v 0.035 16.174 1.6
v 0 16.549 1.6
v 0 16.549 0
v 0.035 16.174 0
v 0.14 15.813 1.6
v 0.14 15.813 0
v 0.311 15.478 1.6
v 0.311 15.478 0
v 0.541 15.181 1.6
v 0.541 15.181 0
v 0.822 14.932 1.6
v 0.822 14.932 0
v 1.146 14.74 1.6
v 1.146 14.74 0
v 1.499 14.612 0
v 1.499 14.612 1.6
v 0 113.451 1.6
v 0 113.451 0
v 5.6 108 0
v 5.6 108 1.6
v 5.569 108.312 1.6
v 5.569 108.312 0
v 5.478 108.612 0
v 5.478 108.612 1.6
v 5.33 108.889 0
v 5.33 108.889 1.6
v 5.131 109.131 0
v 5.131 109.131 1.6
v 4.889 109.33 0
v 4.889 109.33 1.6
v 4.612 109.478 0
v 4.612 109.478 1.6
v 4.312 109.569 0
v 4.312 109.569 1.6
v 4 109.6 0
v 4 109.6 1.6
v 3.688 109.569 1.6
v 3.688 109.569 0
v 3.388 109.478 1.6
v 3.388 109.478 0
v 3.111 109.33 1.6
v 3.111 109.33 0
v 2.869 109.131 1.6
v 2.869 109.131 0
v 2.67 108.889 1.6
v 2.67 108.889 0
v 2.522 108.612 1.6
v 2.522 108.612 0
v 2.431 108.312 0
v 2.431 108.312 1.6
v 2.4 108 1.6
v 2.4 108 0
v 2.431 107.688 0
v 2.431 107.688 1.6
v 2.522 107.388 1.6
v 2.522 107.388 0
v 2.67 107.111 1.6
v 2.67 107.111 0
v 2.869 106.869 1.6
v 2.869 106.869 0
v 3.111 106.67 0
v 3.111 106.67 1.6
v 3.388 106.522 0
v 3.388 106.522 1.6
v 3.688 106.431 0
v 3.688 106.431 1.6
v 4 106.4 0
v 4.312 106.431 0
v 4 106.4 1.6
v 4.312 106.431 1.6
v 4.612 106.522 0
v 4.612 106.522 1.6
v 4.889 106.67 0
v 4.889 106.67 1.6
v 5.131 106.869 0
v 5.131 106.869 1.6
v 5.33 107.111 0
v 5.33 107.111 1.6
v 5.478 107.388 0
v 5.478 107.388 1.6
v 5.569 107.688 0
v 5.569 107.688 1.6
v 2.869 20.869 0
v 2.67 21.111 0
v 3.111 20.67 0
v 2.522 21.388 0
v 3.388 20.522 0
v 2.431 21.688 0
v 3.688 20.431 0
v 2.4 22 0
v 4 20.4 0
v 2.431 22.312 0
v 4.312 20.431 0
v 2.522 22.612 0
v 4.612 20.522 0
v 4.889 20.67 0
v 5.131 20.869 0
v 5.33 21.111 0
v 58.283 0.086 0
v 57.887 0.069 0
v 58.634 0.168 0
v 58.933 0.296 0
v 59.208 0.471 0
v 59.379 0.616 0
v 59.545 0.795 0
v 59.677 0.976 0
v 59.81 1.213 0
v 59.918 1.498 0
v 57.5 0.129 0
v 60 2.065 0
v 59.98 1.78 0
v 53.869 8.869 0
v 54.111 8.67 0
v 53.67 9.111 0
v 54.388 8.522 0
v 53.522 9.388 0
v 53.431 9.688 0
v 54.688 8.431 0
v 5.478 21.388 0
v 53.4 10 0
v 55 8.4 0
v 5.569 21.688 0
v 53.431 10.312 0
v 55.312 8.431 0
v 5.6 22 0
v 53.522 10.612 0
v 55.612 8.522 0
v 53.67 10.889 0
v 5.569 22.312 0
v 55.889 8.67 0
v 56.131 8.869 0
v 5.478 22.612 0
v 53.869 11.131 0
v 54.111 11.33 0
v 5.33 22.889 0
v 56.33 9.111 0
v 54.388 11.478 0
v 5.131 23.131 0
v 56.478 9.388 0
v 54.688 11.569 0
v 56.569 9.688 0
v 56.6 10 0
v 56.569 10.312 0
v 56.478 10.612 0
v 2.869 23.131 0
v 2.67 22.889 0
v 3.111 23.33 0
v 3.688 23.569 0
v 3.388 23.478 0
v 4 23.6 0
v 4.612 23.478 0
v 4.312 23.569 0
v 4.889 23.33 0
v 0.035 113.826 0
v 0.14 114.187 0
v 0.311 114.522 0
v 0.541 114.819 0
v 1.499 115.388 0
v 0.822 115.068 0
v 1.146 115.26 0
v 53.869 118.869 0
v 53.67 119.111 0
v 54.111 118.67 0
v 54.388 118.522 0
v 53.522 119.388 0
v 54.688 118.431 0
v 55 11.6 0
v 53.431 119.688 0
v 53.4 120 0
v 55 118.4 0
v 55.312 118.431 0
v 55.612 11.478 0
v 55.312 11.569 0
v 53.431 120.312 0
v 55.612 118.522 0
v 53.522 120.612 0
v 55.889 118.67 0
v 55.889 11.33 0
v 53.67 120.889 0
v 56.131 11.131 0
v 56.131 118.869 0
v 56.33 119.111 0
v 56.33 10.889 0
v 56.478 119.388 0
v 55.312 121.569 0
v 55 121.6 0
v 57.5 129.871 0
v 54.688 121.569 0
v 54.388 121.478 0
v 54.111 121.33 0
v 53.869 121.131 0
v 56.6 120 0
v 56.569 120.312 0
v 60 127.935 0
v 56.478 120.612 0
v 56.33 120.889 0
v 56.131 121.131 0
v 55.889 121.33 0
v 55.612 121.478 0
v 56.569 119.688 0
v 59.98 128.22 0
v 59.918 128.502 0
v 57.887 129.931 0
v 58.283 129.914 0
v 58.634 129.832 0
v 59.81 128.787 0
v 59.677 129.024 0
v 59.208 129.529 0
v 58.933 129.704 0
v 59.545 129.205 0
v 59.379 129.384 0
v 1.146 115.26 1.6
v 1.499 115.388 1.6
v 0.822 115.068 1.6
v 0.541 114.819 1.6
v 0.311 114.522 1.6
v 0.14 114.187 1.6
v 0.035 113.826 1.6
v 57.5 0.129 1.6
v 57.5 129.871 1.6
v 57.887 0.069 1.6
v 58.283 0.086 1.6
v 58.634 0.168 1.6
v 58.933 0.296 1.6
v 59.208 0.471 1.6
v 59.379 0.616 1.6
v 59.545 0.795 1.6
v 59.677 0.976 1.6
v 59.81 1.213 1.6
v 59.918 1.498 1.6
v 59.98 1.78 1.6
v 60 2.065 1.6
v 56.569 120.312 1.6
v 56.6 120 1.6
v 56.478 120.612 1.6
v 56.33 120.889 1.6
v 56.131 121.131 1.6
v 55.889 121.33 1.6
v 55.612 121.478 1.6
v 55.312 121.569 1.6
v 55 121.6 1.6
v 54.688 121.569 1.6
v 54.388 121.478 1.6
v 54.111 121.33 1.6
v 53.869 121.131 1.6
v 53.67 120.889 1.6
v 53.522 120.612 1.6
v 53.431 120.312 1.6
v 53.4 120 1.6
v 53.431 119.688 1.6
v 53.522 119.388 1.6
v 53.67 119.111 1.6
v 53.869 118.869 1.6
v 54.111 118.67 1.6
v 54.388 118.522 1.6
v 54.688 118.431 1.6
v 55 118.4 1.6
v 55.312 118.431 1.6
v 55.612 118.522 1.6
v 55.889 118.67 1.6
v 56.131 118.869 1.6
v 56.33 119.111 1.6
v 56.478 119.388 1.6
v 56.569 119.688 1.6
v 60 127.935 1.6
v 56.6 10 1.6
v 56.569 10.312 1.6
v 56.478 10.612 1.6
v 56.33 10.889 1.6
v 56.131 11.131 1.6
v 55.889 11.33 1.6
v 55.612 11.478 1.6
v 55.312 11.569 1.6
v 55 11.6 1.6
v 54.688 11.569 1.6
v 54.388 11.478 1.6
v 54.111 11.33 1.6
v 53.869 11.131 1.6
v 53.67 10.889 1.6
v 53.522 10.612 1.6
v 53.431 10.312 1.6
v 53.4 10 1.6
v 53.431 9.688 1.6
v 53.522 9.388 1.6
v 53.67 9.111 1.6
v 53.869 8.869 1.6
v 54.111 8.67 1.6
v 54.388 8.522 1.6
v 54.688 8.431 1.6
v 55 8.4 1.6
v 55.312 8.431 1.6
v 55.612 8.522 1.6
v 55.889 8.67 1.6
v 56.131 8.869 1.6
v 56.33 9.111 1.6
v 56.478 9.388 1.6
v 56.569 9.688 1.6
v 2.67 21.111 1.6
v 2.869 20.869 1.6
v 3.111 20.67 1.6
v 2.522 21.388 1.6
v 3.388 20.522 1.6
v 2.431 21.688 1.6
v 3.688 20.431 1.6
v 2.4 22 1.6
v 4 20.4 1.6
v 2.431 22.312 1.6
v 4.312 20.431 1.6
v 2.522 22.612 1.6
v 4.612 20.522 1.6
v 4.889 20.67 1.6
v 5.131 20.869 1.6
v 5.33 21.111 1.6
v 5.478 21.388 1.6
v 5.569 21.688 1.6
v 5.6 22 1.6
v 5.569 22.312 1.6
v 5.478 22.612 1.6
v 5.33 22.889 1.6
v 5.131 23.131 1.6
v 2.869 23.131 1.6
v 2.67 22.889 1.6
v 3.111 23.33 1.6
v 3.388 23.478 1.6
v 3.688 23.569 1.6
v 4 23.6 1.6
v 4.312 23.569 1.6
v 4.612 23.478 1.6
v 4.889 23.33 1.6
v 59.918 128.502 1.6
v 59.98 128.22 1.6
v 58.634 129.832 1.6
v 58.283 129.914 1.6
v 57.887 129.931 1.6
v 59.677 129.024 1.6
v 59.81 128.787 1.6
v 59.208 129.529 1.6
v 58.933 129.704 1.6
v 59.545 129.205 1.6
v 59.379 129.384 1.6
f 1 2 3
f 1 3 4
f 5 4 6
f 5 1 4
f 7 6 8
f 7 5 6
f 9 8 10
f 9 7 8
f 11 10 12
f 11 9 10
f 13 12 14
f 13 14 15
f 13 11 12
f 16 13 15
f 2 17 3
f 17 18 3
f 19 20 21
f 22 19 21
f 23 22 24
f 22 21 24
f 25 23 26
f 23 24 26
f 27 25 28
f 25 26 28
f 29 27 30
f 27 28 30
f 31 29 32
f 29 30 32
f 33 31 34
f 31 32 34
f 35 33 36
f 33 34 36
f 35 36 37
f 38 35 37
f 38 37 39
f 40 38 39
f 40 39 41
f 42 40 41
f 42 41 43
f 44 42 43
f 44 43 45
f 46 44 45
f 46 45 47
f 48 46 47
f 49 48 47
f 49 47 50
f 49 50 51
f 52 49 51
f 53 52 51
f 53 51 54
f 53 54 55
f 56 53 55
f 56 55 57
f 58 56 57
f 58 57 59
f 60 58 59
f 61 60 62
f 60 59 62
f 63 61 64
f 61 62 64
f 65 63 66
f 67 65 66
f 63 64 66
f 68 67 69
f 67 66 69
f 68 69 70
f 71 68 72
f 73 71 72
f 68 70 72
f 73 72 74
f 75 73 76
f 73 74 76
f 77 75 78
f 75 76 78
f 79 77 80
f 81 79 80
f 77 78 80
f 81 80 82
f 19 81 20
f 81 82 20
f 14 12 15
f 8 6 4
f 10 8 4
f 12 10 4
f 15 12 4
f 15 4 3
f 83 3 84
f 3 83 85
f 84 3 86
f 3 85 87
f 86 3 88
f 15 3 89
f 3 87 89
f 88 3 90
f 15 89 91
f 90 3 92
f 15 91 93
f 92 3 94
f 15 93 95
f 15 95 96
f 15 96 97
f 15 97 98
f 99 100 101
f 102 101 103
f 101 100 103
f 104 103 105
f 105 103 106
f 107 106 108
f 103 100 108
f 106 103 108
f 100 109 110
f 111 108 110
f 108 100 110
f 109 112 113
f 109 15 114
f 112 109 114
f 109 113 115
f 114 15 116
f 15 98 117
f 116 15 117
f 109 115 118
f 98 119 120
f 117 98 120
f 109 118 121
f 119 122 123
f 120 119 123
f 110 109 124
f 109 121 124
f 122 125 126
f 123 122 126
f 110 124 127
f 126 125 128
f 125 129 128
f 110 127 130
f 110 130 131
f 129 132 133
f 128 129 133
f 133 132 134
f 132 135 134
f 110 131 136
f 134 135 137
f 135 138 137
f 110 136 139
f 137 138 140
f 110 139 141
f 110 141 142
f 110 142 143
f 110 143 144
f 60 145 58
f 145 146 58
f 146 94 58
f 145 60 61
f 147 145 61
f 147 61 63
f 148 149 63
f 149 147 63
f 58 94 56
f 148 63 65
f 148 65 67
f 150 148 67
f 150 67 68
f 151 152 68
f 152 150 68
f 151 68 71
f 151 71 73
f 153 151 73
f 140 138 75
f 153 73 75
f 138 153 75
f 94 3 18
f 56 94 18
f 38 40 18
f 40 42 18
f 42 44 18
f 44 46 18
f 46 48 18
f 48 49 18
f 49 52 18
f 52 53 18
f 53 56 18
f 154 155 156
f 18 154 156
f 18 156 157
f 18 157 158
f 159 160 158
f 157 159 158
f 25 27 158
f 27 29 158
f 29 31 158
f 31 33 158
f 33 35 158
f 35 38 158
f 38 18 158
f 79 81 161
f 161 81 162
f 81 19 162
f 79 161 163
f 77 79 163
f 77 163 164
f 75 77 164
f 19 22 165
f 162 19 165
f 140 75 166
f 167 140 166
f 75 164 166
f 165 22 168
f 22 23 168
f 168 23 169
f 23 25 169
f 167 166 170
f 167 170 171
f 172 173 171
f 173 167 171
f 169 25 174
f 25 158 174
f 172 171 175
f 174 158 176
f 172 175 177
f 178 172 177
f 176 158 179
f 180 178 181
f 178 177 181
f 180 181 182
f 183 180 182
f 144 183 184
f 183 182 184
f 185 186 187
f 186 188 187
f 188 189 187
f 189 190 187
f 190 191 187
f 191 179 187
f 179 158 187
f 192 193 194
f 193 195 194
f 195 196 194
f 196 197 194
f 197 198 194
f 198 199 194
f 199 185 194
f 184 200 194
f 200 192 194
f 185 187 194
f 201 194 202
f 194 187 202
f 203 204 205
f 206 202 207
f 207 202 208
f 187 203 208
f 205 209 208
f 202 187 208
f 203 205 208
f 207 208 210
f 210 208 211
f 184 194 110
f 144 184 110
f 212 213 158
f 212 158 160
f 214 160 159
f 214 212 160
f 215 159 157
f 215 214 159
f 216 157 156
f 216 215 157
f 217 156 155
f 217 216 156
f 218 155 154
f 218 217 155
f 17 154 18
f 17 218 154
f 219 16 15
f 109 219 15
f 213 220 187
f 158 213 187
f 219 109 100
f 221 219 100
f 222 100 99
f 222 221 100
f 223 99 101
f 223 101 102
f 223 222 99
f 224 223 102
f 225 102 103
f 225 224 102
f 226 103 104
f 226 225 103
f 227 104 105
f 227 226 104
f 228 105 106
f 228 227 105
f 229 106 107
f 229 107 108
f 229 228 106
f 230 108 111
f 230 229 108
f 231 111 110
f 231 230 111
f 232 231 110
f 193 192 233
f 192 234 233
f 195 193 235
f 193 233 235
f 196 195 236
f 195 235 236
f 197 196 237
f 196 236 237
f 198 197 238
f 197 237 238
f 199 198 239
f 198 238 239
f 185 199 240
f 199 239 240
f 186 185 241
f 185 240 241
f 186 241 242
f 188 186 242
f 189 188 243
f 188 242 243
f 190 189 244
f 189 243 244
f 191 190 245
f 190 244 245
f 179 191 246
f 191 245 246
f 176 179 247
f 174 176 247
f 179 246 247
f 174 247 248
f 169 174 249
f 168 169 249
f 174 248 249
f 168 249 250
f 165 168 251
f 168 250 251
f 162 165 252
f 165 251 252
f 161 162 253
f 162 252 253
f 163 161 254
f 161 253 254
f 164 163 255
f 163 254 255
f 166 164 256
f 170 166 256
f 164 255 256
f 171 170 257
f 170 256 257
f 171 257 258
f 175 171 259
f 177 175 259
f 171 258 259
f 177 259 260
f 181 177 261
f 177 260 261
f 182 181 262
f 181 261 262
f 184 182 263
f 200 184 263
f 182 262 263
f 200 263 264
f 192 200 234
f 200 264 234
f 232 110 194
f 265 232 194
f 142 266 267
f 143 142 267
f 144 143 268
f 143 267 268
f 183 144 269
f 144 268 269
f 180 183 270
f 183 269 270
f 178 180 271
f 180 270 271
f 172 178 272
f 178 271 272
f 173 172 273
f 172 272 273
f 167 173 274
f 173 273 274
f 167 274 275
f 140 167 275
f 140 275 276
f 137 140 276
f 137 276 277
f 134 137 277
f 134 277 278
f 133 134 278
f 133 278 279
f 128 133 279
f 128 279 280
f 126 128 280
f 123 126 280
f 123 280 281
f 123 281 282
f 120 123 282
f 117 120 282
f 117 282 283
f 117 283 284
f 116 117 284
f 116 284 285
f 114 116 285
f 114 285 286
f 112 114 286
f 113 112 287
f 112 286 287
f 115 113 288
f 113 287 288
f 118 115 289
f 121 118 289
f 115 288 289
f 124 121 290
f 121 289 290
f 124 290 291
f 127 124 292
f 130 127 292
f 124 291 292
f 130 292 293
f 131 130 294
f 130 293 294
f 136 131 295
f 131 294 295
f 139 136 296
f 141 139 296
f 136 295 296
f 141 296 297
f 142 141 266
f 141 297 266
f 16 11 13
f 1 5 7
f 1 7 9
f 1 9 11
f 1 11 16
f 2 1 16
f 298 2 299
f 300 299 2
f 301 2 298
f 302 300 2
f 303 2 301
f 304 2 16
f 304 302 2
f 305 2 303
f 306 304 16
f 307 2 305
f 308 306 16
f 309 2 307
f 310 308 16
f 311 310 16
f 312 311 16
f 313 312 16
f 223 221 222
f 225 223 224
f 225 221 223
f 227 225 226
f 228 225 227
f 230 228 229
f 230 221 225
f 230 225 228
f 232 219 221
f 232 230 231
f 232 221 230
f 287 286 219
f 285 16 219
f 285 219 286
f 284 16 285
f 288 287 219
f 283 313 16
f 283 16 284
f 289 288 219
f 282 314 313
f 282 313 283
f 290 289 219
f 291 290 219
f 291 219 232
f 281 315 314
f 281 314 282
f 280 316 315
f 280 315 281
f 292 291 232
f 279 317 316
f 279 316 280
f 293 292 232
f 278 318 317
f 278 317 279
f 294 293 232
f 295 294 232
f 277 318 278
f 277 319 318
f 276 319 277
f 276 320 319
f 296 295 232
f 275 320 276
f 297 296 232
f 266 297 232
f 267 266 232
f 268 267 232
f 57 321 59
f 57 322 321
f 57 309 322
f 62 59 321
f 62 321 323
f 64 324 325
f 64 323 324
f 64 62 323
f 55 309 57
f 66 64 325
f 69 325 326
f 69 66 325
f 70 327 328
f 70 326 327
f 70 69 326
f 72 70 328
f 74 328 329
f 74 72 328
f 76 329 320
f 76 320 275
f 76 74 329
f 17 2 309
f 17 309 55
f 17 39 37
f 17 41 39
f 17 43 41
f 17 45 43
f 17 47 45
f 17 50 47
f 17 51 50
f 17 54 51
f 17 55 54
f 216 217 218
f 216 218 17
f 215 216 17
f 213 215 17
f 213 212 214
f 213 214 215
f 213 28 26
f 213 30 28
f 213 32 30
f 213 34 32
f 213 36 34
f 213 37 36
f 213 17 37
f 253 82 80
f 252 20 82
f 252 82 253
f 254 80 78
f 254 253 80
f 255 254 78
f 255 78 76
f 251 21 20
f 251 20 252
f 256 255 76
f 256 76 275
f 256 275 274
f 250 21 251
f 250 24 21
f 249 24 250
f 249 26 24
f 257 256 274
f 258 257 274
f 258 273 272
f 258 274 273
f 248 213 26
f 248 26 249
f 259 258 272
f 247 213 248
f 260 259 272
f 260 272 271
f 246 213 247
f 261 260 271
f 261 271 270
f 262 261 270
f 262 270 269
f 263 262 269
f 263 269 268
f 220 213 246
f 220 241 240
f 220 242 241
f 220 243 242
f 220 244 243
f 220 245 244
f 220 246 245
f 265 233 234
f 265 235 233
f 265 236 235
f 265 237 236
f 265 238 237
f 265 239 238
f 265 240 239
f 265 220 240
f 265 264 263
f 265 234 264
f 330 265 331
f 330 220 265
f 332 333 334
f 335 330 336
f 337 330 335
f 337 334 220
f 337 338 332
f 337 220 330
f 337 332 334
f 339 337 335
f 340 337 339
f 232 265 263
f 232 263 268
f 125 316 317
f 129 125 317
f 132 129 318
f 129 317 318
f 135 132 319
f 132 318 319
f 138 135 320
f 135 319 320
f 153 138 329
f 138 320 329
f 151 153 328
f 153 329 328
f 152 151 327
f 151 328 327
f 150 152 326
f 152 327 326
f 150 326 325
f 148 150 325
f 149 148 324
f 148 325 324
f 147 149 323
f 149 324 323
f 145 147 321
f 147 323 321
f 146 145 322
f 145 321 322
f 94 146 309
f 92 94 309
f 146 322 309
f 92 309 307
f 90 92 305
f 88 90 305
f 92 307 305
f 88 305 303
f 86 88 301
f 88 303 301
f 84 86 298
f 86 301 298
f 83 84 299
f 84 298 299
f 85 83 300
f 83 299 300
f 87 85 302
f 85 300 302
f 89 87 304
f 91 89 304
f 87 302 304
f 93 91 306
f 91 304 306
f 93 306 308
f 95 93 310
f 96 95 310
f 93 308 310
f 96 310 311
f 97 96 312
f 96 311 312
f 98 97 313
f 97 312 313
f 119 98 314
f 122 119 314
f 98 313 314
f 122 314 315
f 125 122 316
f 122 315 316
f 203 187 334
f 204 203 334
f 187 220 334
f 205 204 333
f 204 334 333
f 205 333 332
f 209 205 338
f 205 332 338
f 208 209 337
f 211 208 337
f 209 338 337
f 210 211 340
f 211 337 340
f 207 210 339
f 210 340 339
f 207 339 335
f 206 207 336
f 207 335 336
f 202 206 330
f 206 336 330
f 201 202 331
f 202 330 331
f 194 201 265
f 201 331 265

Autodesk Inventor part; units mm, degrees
ref_plane "YZ Plane" through (0, 0, 0) normal (1, 0, 0) x (0, 1, 0)
ref_plane "XZ Plane" through (0, 0, 0) normal (0, 1, 0) x (-1, 0, 0)
ref_plane "XY Plane" through (0, 0, 0) normal (0, 0, 1) x (1, 0, 0)
sketch "Esquisse1" plane through (0, 0, 0) normal (0, 0, 1) x (1, 0, 0)
  line L0 (0, 0) -> (60, 0)
  line L1 (60, 0) -> (60, 130)
  line L2 (60, 130) -> (0, 130)
  line L3 (0, 130) -> (0, 0)
  dimension "d0" = 130
  dimension "d1" = 60
extrude "Extrusion1" add sketch "Esquisse1" along normal blind 1.6
chamfer "Chanfrein1" distance 58 distance2 15 1 edges at (0, 130, 0.8) measured on face at (40, 130, 0.5333)
chamfer "Chanfrein2" distance 15 distance2 58 1 edges at (0, 0, 0.8) measured on face at (0, 76.6667, 1.0667)
fillet "Congé1" radius 2 6 edges at (60, 0, 0.8) (0, 15, 0.8) (0, 115, 0.8) (60, 130, 0.8) (58, 130, 0.8) (58, 0, 0.8)
sketch "Esquisse2" plane through (0, 0, 1.6) normal (0, 0, 1) x (1, 0, 0)
  circle A0 centre (4, 22) radius 1.6
  circle A1 centre (55, 10) radius 1.6
  circle A2 centre (4, 108) radius 1.6
  circle A3 centre (55, 120) radius 1.6
  line L0 (0, 113.4514) -> (0, 16.5486) projected
  arc A4 (57.4992, 0.1295) -> (60, 2.0658) centre (58, 2.0658) ccw projected
  arc A5 (60, 127.9342) -> (57.4992, 129.8705) centre (58, 127.9342) ccw projected
  point P0 (0, 0)
  dimension "d11" = 51
  dimension "d12" = 4
  dimension "d13" = 86
  dimension "d14" = 96.9029
  dimension "d15" = 5.4514
  dimension "d16" = 110
  dimension "d17" = 125.8684
  dimension "d18" = 7.9342
  dimension "d19" = 3.2
extrude "Extrusion2" cut sketch "Esquisse2" against normal through all
equation "\"d15\" = -0.5 * d13 + 0.5 * d14"
equation "\"d18\" = -0.5 * d16 + 0.5 * d17"
properties part number "PCBCapteurs" material "Résine phénolique"
